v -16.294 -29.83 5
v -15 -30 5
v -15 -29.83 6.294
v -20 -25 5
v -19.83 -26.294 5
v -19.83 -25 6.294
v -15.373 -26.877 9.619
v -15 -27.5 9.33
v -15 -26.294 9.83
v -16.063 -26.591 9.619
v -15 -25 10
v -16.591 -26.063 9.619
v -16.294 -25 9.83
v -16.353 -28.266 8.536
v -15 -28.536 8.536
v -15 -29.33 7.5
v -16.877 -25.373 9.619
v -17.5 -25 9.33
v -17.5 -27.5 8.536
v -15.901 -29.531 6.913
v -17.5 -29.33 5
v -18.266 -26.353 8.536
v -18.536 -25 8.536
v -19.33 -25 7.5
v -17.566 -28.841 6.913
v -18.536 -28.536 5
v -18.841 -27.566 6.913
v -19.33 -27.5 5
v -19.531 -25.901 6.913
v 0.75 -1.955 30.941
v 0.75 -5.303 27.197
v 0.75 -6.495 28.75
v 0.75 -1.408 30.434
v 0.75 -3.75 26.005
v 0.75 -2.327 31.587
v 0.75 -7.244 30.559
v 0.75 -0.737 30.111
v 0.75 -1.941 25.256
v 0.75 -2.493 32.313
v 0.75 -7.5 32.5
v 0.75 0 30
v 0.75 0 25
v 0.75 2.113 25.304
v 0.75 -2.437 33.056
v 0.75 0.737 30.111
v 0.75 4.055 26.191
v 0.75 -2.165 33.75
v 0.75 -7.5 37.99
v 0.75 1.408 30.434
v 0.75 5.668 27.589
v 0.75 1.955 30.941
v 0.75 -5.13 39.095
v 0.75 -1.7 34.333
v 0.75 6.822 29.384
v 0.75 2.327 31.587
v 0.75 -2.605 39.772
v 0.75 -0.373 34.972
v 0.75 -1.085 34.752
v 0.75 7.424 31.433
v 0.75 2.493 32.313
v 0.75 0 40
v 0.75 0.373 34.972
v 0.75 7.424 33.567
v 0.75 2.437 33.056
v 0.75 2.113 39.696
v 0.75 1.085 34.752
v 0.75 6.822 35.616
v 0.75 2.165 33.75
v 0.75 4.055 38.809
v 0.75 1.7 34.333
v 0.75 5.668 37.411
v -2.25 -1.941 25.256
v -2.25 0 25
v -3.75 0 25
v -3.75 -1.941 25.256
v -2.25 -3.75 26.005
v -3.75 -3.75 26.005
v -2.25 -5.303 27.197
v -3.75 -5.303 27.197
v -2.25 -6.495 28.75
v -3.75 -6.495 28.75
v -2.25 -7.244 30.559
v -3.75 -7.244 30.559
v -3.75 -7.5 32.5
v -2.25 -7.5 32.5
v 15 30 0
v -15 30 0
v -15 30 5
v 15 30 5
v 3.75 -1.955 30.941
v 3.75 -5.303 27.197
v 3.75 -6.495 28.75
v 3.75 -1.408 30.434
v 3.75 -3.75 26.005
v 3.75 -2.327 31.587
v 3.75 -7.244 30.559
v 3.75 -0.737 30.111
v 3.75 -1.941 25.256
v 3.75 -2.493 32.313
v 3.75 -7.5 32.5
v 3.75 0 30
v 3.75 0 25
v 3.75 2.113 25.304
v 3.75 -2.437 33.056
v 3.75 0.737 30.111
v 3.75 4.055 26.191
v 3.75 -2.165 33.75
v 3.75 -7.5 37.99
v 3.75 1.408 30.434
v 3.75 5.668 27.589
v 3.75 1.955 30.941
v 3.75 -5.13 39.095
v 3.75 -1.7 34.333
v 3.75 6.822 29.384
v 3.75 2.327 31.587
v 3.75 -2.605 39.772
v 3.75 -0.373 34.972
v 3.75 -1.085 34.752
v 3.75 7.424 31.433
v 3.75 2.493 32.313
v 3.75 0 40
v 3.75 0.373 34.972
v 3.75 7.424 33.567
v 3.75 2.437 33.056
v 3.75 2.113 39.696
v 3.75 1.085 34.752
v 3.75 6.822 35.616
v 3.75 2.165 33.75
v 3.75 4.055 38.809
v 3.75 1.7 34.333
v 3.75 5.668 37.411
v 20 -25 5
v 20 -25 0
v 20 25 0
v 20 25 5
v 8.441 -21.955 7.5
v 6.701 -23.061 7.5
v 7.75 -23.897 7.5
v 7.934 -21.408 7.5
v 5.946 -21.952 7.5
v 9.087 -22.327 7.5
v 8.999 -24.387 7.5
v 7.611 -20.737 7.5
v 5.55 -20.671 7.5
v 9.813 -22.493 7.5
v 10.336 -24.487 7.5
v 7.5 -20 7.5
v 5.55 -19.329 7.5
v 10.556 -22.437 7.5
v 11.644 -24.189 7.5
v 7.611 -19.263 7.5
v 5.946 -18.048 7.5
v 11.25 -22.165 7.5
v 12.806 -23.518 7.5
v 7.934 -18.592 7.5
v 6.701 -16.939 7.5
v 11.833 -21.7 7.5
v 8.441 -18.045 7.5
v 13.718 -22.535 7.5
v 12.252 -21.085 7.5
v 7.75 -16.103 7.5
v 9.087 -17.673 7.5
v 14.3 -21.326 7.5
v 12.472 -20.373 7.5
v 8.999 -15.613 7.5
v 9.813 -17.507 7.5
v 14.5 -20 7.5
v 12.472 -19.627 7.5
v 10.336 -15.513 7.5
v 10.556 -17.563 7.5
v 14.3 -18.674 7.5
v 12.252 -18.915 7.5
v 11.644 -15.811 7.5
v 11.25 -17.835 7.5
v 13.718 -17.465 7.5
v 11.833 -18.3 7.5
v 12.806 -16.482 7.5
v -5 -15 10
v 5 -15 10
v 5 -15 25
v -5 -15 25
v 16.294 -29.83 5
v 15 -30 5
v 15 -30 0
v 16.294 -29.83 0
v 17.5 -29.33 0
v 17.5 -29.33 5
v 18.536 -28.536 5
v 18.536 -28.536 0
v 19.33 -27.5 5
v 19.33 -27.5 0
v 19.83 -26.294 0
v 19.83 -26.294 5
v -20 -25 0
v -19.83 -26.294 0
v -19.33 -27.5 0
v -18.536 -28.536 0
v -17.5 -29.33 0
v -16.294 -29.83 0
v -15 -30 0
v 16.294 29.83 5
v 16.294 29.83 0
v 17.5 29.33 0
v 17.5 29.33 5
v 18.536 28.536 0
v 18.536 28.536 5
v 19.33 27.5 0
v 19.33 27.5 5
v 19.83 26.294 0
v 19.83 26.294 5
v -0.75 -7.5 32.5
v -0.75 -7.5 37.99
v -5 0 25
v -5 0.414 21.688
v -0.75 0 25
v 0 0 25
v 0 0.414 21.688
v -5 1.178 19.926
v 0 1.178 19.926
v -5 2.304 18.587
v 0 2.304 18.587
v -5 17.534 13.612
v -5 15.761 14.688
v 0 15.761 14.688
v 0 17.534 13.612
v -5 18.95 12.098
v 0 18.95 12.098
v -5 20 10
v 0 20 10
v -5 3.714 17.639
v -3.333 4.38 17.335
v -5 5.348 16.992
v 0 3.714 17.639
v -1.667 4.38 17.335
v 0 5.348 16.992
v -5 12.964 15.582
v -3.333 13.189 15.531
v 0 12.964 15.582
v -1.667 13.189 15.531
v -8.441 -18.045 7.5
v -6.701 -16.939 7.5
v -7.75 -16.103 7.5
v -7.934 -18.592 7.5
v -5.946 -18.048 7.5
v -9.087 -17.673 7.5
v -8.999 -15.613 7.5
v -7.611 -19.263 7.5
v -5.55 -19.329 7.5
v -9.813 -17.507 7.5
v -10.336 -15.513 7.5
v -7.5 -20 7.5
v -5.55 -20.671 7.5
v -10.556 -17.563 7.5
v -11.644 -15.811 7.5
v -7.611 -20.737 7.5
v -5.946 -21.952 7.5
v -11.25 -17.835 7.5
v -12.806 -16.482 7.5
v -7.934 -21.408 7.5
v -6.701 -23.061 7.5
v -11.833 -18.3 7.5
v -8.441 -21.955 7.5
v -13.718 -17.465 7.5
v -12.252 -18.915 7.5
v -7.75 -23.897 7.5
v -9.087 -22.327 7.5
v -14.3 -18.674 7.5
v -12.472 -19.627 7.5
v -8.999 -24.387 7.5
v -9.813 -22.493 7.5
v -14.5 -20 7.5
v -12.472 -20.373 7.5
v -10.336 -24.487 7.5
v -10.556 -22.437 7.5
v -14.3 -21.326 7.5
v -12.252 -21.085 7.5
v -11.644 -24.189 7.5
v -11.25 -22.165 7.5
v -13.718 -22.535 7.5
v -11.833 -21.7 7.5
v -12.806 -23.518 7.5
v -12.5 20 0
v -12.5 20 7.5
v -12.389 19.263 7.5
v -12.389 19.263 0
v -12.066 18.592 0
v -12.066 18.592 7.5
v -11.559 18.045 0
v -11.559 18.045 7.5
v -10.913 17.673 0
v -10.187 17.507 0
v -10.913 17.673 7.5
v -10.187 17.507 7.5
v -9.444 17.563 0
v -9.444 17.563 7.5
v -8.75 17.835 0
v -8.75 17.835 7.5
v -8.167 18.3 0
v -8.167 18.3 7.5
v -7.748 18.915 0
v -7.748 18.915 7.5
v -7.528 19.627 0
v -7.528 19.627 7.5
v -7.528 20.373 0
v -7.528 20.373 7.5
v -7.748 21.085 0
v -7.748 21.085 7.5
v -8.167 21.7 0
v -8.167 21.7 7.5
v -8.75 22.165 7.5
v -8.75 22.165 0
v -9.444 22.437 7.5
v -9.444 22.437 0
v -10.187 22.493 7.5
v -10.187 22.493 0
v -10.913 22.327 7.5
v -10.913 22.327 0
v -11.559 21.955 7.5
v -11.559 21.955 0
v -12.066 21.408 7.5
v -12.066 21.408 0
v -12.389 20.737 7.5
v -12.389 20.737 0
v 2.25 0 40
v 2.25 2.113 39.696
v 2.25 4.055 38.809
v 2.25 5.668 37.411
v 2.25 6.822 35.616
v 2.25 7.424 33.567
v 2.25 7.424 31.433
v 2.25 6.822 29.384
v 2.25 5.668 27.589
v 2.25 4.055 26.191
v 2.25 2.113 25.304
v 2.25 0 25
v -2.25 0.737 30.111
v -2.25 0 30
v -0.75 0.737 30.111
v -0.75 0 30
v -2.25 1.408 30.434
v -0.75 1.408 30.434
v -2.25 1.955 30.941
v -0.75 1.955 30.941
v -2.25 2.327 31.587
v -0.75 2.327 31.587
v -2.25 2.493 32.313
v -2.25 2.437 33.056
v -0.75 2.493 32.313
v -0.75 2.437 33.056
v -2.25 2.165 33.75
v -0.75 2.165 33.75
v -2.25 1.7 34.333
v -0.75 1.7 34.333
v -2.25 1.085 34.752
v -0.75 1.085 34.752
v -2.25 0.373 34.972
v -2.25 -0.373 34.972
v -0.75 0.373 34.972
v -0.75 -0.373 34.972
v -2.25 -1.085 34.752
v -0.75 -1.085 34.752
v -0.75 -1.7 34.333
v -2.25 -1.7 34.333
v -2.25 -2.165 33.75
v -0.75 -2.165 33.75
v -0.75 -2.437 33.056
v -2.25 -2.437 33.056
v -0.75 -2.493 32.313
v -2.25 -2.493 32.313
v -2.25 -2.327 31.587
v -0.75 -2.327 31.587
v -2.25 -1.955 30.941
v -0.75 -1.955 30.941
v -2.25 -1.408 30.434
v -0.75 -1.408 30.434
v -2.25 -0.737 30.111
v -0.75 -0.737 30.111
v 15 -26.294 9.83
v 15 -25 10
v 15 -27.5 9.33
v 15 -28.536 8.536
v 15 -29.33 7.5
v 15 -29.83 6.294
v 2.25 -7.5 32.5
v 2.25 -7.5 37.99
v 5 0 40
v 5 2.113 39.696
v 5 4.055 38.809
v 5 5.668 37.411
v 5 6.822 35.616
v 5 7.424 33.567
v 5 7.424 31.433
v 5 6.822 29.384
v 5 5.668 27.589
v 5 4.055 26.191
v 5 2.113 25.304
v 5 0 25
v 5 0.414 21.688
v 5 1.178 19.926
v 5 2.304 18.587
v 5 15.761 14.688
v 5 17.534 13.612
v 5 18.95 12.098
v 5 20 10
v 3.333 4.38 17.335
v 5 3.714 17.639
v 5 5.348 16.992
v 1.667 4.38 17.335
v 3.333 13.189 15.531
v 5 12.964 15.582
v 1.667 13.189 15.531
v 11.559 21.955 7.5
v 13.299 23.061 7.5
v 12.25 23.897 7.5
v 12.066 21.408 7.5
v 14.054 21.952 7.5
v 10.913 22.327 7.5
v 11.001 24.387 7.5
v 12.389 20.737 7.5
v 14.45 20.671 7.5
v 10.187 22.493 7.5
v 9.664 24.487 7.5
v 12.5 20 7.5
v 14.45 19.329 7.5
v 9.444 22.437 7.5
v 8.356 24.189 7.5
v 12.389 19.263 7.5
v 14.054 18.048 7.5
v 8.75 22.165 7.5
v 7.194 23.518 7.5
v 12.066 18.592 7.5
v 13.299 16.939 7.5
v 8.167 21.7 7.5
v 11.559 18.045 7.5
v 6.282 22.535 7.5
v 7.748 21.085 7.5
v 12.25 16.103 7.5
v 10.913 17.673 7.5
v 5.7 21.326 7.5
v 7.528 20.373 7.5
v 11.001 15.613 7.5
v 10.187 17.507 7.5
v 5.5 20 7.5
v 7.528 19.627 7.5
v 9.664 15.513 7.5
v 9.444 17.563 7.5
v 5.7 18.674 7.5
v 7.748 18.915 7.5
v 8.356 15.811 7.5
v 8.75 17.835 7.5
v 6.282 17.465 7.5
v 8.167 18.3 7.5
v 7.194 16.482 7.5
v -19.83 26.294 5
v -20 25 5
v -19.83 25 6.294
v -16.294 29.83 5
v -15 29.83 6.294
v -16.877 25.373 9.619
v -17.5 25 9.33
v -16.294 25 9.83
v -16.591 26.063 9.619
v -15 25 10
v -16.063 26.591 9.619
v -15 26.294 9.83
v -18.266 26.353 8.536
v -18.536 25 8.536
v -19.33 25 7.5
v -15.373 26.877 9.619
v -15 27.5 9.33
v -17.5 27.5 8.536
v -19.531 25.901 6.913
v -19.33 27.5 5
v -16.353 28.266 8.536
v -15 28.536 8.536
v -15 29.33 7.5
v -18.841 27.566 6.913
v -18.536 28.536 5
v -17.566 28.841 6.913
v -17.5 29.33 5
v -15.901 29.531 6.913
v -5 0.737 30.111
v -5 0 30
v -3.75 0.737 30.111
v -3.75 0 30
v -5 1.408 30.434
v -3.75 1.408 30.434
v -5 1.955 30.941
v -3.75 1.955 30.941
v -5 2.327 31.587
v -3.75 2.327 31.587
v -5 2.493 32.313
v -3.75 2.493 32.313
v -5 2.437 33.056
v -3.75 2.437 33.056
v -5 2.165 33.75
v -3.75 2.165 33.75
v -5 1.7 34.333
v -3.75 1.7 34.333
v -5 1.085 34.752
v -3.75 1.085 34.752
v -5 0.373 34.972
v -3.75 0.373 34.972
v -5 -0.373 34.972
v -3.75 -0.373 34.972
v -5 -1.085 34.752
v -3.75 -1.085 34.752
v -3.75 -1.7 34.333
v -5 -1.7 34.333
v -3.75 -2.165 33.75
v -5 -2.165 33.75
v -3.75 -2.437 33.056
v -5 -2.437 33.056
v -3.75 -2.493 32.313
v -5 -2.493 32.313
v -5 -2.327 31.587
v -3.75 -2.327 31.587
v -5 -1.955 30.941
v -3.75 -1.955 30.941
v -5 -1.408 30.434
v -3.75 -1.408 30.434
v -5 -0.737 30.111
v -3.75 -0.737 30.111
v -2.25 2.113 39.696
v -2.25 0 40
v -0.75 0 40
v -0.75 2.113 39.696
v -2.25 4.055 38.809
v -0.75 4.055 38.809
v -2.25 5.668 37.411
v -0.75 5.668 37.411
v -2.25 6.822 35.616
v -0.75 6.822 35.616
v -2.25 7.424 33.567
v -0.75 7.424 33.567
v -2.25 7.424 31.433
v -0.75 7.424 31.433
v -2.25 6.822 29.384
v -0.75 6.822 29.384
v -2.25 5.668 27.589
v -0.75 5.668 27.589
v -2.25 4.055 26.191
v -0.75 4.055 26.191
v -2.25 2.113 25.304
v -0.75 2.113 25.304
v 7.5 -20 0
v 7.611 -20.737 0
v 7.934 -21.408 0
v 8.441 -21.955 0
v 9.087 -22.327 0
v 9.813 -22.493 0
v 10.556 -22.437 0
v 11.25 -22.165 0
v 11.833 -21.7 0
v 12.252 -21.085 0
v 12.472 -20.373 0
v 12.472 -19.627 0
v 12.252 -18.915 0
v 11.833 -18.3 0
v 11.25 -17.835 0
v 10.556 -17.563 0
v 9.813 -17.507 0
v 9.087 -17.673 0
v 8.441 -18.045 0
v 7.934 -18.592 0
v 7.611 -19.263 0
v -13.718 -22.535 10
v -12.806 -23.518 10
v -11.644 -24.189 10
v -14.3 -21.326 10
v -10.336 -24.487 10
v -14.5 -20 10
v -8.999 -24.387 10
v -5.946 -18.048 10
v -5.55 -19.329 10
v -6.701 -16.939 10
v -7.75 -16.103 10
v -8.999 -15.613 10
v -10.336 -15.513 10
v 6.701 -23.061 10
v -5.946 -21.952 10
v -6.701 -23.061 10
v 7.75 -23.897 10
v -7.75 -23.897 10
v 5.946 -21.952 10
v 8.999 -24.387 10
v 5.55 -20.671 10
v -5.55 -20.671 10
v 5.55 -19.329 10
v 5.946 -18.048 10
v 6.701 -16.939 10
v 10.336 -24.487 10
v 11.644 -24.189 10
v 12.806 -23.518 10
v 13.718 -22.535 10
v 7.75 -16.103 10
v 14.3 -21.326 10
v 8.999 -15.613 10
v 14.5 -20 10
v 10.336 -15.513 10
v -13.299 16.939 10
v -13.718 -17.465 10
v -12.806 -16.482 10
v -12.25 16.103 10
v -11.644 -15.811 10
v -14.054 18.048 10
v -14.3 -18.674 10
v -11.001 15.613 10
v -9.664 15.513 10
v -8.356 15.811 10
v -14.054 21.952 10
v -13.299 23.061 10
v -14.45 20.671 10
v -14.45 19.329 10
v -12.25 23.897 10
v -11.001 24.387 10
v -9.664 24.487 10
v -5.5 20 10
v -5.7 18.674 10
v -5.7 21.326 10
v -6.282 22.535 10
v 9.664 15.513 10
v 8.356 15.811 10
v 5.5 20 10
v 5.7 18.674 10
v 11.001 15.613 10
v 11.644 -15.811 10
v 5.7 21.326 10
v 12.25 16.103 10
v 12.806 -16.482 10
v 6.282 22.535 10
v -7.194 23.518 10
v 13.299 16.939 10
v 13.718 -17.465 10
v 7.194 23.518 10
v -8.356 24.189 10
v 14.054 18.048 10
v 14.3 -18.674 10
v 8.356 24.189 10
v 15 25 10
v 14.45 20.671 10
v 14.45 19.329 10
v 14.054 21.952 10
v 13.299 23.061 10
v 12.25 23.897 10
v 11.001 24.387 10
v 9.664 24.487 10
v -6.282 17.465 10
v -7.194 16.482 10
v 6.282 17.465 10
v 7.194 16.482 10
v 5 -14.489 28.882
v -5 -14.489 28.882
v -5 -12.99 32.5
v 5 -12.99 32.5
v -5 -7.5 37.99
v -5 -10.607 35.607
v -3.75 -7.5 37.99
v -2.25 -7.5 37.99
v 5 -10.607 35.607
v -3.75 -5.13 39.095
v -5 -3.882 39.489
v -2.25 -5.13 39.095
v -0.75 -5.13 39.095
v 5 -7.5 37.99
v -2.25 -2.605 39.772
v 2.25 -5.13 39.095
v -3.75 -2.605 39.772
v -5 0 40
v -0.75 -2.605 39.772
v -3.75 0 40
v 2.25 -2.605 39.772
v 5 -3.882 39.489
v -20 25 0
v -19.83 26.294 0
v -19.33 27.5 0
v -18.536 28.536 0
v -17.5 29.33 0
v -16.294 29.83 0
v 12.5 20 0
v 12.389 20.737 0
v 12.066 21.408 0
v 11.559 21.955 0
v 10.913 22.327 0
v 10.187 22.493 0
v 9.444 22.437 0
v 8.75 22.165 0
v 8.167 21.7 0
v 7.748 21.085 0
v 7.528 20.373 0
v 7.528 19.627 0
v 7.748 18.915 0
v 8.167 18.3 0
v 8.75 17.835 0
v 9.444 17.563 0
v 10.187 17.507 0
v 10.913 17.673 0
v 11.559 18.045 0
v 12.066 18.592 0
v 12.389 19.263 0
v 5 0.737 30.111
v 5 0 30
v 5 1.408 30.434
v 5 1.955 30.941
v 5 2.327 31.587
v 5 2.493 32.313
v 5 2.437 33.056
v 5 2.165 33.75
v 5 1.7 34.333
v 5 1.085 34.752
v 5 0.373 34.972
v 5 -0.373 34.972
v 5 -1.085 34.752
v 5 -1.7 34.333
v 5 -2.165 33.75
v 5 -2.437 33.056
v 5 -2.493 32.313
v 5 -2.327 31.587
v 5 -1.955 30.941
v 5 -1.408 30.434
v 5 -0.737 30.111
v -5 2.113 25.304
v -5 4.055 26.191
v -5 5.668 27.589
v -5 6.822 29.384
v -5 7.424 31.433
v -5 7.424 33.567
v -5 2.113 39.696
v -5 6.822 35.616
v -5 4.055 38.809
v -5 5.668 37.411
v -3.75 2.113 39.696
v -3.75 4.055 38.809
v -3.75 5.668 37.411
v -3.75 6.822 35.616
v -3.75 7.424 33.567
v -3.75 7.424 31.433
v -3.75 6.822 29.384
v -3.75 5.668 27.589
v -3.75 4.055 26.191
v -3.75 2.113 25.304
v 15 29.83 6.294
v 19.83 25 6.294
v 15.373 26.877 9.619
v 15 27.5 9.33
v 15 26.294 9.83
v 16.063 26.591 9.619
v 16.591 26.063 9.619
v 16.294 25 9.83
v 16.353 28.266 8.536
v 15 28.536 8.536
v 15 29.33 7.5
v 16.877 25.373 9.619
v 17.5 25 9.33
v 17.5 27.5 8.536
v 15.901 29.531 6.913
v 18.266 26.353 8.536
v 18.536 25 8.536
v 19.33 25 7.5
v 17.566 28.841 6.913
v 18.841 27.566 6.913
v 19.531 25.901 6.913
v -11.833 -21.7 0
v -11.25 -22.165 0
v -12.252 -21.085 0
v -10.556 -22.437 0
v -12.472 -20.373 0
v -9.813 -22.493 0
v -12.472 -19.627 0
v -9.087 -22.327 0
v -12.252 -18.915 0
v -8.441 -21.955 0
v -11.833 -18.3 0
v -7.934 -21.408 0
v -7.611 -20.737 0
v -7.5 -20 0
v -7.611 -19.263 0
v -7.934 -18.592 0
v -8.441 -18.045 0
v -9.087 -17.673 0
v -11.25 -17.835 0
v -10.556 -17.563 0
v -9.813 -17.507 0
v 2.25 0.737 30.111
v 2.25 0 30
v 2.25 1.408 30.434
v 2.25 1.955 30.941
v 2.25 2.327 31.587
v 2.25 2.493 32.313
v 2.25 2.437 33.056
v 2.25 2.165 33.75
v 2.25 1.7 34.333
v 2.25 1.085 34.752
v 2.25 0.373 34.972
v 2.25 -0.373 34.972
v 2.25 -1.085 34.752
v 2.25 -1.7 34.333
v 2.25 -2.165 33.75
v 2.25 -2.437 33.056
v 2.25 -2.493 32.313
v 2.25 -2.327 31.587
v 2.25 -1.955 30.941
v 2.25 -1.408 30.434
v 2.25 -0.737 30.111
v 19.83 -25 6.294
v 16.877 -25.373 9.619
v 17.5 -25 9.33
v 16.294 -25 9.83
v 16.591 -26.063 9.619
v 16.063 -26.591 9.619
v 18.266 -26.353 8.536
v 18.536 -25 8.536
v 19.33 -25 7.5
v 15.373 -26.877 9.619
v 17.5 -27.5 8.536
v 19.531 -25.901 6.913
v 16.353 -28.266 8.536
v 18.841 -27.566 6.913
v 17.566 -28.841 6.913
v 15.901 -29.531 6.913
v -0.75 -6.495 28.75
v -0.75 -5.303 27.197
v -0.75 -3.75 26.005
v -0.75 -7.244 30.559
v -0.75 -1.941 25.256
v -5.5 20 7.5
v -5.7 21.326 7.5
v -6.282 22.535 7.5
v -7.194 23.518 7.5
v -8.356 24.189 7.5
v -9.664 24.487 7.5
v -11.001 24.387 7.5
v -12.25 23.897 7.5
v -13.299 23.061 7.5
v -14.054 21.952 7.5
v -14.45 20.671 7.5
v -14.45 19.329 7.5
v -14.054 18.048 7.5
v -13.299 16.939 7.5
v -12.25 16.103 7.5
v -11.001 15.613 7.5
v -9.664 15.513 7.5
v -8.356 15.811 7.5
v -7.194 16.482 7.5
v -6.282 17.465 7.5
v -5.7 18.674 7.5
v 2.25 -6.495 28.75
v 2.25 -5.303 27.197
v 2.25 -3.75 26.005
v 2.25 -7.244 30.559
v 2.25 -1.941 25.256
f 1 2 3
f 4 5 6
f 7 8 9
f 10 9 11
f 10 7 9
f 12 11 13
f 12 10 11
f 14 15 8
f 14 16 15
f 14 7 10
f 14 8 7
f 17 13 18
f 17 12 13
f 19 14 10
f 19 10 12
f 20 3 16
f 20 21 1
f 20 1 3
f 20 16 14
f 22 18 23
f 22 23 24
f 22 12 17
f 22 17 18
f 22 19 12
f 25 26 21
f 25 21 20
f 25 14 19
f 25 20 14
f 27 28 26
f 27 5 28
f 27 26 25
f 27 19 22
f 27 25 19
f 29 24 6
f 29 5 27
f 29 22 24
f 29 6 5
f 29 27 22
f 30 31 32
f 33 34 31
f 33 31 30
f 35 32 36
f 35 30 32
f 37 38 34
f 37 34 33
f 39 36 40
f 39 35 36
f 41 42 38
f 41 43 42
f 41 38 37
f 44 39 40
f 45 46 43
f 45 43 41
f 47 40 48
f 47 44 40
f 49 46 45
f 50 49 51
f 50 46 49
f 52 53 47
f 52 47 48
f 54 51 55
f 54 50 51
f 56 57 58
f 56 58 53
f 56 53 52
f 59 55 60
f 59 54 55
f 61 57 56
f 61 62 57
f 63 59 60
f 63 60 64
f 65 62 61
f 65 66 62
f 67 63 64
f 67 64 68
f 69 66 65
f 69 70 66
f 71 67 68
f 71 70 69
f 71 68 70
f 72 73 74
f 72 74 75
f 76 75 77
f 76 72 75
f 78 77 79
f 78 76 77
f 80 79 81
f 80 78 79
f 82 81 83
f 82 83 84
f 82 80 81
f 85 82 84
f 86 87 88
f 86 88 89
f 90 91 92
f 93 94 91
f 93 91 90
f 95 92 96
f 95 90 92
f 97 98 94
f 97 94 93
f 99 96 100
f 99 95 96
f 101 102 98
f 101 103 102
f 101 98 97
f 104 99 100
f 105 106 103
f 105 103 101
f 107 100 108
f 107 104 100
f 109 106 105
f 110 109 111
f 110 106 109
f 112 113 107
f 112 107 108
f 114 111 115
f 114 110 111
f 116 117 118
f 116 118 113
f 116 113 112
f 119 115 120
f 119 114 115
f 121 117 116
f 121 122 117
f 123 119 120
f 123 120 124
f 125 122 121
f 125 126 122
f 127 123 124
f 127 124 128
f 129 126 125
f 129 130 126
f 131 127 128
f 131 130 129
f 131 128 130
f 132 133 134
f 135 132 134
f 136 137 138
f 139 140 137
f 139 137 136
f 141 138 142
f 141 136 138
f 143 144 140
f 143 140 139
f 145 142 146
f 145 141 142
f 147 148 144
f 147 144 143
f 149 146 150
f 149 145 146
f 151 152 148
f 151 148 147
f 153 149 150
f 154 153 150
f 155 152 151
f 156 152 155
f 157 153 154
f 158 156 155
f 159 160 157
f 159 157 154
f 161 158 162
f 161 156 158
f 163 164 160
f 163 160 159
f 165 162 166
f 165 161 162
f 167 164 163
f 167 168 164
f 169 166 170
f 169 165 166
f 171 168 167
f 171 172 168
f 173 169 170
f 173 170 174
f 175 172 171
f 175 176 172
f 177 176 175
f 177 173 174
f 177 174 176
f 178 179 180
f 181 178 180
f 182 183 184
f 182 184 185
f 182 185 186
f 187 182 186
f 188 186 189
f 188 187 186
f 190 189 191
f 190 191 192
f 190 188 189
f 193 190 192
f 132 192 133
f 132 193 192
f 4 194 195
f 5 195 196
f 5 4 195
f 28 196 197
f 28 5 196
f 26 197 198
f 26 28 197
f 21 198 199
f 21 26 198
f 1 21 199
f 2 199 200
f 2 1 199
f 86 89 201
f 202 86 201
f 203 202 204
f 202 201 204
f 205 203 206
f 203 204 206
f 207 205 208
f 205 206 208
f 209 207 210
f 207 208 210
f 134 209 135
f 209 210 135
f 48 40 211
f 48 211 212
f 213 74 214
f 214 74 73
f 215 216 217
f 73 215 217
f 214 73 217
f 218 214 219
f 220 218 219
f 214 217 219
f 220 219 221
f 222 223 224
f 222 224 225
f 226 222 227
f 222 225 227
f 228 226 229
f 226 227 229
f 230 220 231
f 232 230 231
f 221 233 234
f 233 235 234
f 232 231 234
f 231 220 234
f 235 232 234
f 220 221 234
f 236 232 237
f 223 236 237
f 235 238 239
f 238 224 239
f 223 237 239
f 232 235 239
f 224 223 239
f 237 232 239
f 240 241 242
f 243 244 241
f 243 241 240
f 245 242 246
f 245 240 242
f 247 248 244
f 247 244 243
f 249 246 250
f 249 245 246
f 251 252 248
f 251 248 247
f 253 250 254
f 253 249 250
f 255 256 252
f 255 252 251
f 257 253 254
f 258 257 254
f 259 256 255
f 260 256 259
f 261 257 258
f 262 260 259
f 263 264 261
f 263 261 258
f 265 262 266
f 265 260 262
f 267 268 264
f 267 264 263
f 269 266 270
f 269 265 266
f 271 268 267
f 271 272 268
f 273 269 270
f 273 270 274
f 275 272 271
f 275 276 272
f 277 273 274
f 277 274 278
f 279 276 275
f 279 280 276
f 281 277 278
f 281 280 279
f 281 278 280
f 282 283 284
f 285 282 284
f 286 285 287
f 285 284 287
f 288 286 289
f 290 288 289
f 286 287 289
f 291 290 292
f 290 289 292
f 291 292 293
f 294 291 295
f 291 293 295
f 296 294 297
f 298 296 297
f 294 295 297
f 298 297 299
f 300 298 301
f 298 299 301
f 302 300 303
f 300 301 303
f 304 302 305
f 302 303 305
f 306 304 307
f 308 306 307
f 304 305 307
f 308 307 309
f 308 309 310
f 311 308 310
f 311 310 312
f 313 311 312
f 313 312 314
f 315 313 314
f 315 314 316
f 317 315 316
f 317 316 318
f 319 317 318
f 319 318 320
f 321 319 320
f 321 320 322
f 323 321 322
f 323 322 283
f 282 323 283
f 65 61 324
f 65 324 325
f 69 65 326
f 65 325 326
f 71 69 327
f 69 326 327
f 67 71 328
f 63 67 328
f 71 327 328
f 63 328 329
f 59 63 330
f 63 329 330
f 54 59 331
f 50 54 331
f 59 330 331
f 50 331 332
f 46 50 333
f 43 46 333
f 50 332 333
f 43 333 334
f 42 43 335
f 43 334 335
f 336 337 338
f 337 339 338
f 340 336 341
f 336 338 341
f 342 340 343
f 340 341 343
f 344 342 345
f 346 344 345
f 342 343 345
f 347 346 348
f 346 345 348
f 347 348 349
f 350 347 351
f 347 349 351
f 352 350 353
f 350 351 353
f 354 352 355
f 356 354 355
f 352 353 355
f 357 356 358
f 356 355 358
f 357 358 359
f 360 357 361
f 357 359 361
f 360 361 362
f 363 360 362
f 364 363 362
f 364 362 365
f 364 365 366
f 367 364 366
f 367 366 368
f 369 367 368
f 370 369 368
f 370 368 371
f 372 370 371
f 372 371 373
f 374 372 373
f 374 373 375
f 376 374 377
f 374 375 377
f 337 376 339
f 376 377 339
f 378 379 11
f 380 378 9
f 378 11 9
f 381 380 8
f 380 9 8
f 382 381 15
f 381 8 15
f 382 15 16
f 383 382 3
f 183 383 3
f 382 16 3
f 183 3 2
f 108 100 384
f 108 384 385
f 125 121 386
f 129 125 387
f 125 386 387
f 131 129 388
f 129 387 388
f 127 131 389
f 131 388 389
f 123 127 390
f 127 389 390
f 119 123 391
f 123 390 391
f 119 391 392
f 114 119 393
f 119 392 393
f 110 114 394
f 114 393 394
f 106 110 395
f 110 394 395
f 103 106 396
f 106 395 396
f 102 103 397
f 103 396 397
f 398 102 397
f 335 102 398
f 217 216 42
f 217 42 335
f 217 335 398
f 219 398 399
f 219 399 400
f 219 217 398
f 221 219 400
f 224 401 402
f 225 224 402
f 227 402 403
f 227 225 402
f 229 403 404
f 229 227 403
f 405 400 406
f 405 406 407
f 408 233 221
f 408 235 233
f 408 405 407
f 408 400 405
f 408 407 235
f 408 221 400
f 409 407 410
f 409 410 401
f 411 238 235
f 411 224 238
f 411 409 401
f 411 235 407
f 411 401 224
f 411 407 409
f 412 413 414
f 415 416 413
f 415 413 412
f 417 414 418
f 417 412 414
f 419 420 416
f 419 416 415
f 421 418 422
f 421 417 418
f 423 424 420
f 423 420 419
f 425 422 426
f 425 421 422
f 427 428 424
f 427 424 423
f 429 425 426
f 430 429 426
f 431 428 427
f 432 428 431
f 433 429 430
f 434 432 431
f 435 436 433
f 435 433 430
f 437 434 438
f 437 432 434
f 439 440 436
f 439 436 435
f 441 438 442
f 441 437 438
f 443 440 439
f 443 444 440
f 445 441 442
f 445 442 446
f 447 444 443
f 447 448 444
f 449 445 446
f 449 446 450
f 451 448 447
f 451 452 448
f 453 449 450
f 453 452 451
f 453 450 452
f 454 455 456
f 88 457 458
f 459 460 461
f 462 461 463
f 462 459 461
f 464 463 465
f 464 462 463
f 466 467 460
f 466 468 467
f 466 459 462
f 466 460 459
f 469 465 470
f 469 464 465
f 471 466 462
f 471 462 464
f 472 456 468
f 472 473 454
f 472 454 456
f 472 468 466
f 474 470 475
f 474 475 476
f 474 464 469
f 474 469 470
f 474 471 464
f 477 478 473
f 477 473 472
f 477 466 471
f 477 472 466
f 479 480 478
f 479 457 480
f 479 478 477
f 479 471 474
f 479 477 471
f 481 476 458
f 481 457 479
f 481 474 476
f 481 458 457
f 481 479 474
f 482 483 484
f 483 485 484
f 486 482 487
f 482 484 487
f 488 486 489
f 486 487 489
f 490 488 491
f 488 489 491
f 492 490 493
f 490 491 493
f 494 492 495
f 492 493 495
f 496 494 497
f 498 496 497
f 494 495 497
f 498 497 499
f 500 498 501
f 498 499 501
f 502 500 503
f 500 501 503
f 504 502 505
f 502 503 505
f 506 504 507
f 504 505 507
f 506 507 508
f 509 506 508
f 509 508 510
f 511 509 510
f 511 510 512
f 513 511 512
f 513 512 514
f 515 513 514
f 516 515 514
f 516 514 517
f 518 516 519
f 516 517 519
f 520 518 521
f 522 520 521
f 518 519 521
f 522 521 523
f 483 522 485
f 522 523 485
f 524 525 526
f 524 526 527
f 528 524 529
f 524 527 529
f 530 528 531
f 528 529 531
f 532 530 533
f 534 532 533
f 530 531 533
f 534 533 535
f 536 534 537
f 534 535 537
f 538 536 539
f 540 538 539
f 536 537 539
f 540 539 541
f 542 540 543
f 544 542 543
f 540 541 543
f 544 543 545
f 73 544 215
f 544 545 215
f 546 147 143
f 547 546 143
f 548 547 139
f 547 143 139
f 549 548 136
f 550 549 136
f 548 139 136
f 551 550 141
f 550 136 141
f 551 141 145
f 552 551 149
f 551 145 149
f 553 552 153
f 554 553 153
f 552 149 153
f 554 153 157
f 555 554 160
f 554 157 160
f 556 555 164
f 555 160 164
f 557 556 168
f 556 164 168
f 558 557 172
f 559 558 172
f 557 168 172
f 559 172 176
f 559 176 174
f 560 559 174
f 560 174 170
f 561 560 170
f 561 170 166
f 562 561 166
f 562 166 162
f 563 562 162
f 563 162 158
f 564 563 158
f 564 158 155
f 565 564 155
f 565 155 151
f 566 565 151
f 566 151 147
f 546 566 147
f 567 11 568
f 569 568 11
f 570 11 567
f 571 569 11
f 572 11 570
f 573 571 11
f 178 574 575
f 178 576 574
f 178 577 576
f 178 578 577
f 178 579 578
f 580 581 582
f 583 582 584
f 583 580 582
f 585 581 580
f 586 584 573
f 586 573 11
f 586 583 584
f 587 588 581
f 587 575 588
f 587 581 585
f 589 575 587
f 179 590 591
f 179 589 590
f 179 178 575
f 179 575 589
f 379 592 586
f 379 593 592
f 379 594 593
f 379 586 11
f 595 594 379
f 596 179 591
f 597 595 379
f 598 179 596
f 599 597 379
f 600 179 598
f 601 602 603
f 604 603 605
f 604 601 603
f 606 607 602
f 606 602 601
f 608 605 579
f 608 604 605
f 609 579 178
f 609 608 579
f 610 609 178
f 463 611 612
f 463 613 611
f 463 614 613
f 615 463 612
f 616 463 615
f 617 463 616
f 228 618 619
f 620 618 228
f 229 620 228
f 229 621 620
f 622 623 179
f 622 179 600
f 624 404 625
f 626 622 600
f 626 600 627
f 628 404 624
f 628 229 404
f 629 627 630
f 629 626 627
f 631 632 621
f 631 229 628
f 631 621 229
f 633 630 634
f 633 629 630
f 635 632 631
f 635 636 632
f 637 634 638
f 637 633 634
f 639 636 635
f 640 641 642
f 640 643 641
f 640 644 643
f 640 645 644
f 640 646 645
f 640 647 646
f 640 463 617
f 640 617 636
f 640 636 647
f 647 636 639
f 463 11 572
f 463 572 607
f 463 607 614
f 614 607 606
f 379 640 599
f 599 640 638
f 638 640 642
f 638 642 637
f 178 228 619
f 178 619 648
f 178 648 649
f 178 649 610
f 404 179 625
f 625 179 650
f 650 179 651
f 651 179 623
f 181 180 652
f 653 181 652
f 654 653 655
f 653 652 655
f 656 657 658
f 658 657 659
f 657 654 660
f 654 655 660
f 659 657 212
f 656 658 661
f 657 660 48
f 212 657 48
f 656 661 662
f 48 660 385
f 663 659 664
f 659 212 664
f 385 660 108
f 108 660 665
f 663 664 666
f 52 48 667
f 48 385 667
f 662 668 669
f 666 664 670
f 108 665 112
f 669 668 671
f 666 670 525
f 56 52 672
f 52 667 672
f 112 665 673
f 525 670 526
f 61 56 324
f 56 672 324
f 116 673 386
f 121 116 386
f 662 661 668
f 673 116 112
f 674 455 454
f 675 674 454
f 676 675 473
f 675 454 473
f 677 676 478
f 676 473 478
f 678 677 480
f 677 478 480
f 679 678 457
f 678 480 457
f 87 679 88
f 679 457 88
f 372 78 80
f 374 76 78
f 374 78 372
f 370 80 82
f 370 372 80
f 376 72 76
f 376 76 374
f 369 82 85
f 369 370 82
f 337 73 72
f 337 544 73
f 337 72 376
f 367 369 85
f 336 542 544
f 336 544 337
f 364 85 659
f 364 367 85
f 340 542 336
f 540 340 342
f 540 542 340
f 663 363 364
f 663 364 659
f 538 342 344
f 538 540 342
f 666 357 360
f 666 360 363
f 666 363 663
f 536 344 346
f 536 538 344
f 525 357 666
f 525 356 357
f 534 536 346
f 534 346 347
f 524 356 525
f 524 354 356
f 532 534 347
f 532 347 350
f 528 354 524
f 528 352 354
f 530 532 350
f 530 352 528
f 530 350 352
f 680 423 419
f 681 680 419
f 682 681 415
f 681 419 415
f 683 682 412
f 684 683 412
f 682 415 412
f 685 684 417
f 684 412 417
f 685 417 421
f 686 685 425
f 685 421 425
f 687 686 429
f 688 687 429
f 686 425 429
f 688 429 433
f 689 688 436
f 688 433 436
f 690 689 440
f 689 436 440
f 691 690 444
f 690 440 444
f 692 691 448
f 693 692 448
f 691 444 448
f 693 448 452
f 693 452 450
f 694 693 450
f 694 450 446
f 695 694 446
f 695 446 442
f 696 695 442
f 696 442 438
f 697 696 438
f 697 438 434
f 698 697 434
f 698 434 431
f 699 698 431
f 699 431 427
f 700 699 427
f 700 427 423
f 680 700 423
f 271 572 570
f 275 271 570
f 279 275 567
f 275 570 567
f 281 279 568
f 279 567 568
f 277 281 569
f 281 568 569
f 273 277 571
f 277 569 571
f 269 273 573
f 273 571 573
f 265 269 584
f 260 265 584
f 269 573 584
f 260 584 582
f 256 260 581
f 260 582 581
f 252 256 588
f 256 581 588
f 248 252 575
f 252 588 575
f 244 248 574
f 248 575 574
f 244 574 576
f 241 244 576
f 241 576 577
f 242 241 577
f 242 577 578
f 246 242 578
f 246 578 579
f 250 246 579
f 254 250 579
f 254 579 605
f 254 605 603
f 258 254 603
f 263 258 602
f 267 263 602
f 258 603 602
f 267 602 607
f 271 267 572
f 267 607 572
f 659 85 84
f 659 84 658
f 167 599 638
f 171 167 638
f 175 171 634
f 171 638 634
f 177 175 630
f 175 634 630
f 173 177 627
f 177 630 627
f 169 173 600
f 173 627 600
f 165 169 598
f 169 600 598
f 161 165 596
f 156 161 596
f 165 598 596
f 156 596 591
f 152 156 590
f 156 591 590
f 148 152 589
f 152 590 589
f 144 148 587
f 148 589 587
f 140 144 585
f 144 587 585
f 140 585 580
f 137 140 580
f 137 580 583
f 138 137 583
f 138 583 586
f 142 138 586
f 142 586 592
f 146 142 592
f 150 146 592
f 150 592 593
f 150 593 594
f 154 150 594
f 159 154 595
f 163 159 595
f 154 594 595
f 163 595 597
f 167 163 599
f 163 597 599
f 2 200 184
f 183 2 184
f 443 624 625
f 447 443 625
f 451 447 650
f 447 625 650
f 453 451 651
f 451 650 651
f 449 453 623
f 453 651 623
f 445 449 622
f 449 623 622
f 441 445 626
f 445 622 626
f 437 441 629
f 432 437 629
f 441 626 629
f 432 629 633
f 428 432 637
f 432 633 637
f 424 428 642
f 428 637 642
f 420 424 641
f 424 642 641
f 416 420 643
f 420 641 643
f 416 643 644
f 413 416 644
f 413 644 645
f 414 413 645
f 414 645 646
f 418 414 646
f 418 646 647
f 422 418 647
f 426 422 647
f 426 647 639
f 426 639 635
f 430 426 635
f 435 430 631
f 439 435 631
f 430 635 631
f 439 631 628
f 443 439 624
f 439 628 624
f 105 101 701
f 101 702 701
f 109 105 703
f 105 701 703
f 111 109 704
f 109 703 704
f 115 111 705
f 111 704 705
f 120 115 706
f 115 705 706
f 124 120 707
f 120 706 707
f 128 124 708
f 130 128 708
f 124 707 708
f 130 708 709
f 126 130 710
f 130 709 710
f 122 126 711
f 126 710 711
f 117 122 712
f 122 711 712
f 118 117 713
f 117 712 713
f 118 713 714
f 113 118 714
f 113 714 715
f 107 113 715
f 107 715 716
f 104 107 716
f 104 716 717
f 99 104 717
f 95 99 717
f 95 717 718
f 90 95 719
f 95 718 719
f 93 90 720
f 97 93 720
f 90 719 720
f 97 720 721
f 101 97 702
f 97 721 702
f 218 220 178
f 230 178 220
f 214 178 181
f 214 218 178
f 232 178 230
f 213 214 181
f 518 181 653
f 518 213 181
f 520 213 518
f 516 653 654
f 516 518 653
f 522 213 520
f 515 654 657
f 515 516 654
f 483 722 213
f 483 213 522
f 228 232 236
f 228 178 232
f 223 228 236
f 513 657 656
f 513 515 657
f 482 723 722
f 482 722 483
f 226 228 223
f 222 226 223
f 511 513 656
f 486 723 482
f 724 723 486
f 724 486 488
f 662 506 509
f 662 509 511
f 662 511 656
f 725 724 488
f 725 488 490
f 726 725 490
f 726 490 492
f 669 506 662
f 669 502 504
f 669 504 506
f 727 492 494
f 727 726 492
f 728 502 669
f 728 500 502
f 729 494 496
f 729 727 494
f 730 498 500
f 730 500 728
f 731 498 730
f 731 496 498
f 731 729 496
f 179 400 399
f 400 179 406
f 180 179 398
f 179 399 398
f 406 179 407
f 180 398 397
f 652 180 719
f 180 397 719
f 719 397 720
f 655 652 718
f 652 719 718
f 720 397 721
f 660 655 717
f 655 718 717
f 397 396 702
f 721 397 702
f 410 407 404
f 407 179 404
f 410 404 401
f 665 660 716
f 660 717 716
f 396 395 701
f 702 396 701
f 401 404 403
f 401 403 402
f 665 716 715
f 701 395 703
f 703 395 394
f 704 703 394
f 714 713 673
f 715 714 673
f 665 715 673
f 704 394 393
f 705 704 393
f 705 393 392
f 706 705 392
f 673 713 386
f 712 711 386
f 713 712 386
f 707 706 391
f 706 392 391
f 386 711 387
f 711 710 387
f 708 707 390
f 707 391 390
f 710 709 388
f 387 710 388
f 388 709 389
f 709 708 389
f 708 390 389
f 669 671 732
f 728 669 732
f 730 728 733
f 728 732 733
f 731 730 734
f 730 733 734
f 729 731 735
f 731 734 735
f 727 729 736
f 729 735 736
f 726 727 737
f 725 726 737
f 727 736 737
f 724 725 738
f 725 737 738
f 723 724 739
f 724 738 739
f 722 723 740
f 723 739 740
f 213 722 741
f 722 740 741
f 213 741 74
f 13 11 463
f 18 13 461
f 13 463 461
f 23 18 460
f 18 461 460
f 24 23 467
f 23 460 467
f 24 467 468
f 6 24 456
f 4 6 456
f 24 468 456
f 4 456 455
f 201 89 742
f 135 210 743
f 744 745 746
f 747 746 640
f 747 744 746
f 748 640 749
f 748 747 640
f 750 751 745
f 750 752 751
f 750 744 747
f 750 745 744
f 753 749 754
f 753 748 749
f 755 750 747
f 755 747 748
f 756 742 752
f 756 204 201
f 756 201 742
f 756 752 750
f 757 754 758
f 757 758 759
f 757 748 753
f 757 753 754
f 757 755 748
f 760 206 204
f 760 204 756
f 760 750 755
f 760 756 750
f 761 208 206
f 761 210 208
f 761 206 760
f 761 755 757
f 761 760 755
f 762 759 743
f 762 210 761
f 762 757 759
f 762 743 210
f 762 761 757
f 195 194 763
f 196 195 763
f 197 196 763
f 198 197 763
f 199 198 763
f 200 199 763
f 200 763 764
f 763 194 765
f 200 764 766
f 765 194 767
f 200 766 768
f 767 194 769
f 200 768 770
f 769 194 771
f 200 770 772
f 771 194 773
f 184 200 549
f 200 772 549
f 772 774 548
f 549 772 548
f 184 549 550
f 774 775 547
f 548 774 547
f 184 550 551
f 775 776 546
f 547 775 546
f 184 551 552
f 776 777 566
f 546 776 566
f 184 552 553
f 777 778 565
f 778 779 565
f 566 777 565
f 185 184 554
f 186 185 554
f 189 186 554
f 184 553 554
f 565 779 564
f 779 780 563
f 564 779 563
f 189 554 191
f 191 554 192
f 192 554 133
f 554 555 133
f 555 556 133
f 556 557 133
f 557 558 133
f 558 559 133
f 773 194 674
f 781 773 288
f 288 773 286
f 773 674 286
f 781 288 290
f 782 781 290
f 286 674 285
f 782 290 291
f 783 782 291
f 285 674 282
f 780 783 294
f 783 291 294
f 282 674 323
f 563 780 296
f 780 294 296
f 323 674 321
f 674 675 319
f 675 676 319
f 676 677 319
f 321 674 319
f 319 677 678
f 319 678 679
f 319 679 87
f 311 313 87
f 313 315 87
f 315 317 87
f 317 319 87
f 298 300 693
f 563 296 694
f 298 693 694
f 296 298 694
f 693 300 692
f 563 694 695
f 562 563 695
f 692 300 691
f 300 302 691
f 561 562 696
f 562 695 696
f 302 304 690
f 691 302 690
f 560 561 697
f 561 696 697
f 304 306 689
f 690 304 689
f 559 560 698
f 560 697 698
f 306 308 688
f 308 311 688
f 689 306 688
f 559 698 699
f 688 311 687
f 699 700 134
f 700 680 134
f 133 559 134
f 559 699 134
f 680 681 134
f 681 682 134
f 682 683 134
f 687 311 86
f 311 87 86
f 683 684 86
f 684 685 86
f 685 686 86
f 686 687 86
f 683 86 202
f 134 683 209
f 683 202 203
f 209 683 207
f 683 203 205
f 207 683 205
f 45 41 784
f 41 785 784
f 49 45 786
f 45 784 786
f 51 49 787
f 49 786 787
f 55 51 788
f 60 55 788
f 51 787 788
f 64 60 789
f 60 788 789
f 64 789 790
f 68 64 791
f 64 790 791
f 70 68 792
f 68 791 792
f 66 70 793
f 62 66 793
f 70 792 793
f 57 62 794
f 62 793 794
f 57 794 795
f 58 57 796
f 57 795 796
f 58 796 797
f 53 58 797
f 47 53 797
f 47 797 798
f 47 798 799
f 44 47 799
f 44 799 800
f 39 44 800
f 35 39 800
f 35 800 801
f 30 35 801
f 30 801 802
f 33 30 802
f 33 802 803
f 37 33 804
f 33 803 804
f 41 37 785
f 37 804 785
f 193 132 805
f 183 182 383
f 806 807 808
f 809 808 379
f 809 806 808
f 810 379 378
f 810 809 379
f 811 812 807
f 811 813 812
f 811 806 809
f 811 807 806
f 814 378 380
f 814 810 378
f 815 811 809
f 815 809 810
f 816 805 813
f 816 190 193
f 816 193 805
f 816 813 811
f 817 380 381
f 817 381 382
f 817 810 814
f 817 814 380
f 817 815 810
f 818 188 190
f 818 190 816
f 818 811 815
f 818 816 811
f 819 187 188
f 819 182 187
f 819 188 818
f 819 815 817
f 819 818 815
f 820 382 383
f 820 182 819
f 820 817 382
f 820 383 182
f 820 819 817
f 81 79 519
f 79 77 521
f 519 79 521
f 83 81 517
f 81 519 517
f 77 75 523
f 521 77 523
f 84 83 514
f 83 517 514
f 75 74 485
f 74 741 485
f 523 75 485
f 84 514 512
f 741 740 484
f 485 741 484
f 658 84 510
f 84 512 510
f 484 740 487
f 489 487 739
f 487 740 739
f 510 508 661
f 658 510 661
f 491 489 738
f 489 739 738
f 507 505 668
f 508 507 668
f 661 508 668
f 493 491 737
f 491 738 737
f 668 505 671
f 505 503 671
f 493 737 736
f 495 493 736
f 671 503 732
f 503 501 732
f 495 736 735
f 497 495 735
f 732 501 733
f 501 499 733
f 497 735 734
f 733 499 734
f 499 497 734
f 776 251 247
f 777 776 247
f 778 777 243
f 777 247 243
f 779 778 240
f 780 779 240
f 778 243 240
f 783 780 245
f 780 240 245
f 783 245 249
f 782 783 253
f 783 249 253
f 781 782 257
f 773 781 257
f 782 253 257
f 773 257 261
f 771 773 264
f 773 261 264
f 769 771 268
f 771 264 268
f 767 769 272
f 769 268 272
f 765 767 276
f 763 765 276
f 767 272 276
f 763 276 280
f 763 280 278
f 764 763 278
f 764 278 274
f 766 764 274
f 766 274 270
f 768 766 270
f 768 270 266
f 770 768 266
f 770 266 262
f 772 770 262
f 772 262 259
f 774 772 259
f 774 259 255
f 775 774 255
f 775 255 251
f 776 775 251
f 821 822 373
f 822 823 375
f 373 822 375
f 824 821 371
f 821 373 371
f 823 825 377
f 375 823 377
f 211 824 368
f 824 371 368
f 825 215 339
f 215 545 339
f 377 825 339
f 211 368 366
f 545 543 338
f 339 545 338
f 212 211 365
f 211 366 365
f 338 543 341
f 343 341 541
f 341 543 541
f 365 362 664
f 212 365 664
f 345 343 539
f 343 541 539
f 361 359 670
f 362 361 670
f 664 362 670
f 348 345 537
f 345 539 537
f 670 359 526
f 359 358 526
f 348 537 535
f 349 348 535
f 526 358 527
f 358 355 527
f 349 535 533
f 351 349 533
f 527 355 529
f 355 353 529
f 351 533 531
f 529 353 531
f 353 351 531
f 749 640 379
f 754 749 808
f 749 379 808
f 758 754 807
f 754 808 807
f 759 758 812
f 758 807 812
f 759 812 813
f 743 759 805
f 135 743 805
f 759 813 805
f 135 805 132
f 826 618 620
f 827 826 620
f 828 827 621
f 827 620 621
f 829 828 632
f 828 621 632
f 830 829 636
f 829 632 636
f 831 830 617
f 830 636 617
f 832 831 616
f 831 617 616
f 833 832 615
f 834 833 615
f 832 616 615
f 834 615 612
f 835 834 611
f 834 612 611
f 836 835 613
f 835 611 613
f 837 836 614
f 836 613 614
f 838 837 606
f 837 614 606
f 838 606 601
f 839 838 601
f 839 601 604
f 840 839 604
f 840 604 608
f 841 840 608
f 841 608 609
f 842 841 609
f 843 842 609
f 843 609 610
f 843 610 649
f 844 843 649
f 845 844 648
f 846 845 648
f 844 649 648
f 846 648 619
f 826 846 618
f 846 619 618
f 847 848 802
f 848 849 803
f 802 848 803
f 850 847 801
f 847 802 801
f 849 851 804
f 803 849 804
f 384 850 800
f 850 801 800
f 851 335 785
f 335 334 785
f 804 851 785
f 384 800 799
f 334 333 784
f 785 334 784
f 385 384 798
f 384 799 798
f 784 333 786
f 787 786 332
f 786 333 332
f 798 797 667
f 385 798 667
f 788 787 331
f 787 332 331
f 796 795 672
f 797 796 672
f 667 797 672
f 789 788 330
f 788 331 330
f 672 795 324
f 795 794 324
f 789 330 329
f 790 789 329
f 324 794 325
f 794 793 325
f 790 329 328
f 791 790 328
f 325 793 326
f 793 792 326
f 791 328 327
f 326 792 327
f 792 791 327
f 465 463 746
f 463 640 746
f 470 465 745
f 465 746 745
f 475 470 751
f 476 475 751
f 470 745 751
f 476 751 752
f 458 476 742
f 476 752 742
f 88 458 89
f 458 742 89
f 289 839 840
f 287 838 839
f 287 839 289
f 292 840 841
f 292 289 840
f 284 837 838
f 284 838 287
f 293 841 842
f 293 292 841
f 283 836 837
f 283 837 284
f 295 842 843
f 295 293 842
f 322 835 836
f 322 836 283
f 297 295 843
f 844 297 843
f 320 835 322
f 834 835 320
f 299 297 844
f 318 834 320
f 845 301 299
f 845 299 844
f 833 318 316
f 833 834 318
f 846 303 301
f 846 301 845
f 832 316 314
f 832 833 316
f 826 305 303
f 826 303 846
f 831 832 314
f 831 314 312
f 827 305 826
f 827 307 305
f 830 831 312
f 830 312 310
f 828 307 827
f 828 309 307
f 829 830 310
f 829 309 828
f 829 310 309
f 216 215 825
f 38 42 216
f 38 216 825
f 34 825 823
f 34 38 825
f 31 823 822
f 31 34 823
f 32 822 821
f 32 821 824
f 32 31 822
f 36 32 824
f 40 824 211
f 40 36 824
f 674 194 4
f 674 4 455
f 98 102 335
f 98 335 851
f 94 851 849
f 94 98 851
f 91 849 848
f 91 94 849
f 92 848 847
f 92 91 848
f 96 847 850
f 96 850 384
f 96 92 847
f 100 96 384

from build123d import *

# Parameters (mm, degrees)
SKETCH1_W           = 40
SKETCH1_H           = 60
BOSS_EXTRUDE1_DEPTH = 10
SKETCH2_R           = 2.5
CUT_EXTRUDE1_DEPTH  = 10
FILLET1_R           = 5
FILLET2_R           = 5
BOSS_EXTRUDE2_DEPTH = 5
CUT_EXTRUDE2_DEPTH  = 0.75
LPATTERN1_COUNT     = 2
LPATTERN1_PITCH     = 3
LPATTERN2_COUNT     = 2
LPATTERN2_PITCH     = 3
SKETCH5_R           = 4.5
CUT_EXTRUDE3_DEPTH  = 2.5
SKETCH6_R           = 2.5
CUT_EXTRUDE4_DEPTH  = 23.5


with BuildPart() as part:
    # Sketch1 → Boss-Extrude1 (new body)
    with BuildSketch(Plane.XY):
        Rectangle(SKETCH1_W, SKETCH1_H)
    extrude(amount=BOSS_EXTRUDE1_DEPTH)

    # Sketch2 → Cut-Extrude1 (cut)
    with BuildSketch(Plane.XY.offset(10)):
        with Locations((-10, -20)):
            Circle(SKETCH2_R)
        with Locations(Location((10, -20, 0), (0, 0, 180))):
            Circle(SKETCH2_R)
        with Locations((10, 20)):
            Circle(SKETCH2_R)
        with Locations(Location((-10, 20, 0), (0, 0, 180))):
            Circle(SKETCH2_R)
    extrude(amount=-CUT_EXTRUDE1_DEPTH, mode=Mode.SUBTRACT)

    # Fillet1
    fillet1_edges = [part.edges().sort_by_distance(p)[0] for p in [
        (20, -30, 5),
        (-20, -30, 5),
        (-20, 30, 5),
        (20, 30, 5),
    ]]
    fillet(fillet1_edges, radius=FILLET1_R)

    # Fillet2
    fillet2_edges = [part.edges().sort_by_distance(p)[0] for p in [
        (0, 30, 10),
        (20, 0, 10),
        (-20, 0, 10),
        (0, -30, 10),
        (-18.535533906, 28.535533906, 10),
        (-18.535533906, -28.535533906, 10),
        (18.535533906, -28.535533906, 10),
        (18.535533906, 28.535533906, 10),
    ]]
    fillet(fillet2_edges, radius=FILLET2_R)

    # Sketch3 → Boss-Extrude2 (add, symmetric)
    with BuildSketch(Plane(origin=(0, 0, 0), x_dir=(0, 0, -1), z_dir=(1, 0, 0))):
        with BuildLine():
            Line((-10, -15), (-25, -15))
            ThreePointArc((-25, -15), (-35.606601718, -10.606601718), (-40, 0))
            ThreePointArc((-40, 0), (-32.5, 7.5), (-25, 0))
            add(Edge.make_bspline(
                [(-25, 0), (-11.206458261, 0.023360815), (-20.592449016, 16.330430805), (-10, 20)],
                knots=[0, 0, 0, 0, 1, 1, 1, 1], degree=3))
            Line((-10, 20), (-10, -15))
        make_face()
    extrude(amount=BOSS_EXTRUDE2_DEPTH, both=True)

    # Sketch4 → Cut-Extrude2 (cut, symmetric)
    with BuildSketch(Plane(origin=(0, 0, 0), x_dir=(0, 0, -1), z_dir=(1, 0, 0))):
        with BuildLine():
            Line((-32.5, -7.5), (-40, -7.5))
            Line((-40, -7.5), (-40, 0))
            ThreePointArc((-40, 0), (-27.196699141, 5.303300859), (-32.5, -7.5))
        make_face()
    cut_extrude2 = extrude(amount=CUT_EXTRUDE2_DEPTH, both=True, mode=Mode.SUBTRACT)

    # LPattern1: Cut-Extrude2 ×2
    with Locations(*[(-i * LPATTERN1_PITCH, 0, 0) for i in range(1, LPATTERN1_COUNT)]):
        add(cut_extrude2, mode=Mode.SUBTRACT)

    # LPattern2: Cut-Extrude2 ×2
    with Locations(*[(i * LPATTERN2_PITCH, 0, 0) for i in range(1, LPATTERN2_COUNT)]):
        add(cut_extrude2, mode=Mode.SUBTRACT)

    # Sketch5 → Cut-Extrude3 (cut, symmetric)
    with BuildSketch(Plane.XY.offset(10)):
        with Locations(Location((-10, -20, 0), (0, 0, 180))):
            Circle(SKETCH5_R)
        with Locations((-10, 20)):
            Circle(SKETCH5_R)
        with Locations((10, -20)):
            Circle(SKETCH5_R)
        with Locations(Location((10, 20, 0), (0, 0, 180))):
            Circle(SKETCH5_R)
    extrude(amount=CUT_EXTRUDE3_DEPTH, both=True, mode=Mode.SUBTRACT)

    # Sketch6 → Cut-Extrude4 (cut, symmetric)
    with BuildSketch(Plane(origin=(5, 0, 0), x_dir=(0, 0, -1), z_dir=(1, 0, 0))):
        with Locations((-32.5, 0)):
            Circle(SKETCH6_R)
    extrude(amount=CUT_EXTRUDE4_DEPTH, both=True, mode=Mode.SUBTRACT)


solid = part.part
